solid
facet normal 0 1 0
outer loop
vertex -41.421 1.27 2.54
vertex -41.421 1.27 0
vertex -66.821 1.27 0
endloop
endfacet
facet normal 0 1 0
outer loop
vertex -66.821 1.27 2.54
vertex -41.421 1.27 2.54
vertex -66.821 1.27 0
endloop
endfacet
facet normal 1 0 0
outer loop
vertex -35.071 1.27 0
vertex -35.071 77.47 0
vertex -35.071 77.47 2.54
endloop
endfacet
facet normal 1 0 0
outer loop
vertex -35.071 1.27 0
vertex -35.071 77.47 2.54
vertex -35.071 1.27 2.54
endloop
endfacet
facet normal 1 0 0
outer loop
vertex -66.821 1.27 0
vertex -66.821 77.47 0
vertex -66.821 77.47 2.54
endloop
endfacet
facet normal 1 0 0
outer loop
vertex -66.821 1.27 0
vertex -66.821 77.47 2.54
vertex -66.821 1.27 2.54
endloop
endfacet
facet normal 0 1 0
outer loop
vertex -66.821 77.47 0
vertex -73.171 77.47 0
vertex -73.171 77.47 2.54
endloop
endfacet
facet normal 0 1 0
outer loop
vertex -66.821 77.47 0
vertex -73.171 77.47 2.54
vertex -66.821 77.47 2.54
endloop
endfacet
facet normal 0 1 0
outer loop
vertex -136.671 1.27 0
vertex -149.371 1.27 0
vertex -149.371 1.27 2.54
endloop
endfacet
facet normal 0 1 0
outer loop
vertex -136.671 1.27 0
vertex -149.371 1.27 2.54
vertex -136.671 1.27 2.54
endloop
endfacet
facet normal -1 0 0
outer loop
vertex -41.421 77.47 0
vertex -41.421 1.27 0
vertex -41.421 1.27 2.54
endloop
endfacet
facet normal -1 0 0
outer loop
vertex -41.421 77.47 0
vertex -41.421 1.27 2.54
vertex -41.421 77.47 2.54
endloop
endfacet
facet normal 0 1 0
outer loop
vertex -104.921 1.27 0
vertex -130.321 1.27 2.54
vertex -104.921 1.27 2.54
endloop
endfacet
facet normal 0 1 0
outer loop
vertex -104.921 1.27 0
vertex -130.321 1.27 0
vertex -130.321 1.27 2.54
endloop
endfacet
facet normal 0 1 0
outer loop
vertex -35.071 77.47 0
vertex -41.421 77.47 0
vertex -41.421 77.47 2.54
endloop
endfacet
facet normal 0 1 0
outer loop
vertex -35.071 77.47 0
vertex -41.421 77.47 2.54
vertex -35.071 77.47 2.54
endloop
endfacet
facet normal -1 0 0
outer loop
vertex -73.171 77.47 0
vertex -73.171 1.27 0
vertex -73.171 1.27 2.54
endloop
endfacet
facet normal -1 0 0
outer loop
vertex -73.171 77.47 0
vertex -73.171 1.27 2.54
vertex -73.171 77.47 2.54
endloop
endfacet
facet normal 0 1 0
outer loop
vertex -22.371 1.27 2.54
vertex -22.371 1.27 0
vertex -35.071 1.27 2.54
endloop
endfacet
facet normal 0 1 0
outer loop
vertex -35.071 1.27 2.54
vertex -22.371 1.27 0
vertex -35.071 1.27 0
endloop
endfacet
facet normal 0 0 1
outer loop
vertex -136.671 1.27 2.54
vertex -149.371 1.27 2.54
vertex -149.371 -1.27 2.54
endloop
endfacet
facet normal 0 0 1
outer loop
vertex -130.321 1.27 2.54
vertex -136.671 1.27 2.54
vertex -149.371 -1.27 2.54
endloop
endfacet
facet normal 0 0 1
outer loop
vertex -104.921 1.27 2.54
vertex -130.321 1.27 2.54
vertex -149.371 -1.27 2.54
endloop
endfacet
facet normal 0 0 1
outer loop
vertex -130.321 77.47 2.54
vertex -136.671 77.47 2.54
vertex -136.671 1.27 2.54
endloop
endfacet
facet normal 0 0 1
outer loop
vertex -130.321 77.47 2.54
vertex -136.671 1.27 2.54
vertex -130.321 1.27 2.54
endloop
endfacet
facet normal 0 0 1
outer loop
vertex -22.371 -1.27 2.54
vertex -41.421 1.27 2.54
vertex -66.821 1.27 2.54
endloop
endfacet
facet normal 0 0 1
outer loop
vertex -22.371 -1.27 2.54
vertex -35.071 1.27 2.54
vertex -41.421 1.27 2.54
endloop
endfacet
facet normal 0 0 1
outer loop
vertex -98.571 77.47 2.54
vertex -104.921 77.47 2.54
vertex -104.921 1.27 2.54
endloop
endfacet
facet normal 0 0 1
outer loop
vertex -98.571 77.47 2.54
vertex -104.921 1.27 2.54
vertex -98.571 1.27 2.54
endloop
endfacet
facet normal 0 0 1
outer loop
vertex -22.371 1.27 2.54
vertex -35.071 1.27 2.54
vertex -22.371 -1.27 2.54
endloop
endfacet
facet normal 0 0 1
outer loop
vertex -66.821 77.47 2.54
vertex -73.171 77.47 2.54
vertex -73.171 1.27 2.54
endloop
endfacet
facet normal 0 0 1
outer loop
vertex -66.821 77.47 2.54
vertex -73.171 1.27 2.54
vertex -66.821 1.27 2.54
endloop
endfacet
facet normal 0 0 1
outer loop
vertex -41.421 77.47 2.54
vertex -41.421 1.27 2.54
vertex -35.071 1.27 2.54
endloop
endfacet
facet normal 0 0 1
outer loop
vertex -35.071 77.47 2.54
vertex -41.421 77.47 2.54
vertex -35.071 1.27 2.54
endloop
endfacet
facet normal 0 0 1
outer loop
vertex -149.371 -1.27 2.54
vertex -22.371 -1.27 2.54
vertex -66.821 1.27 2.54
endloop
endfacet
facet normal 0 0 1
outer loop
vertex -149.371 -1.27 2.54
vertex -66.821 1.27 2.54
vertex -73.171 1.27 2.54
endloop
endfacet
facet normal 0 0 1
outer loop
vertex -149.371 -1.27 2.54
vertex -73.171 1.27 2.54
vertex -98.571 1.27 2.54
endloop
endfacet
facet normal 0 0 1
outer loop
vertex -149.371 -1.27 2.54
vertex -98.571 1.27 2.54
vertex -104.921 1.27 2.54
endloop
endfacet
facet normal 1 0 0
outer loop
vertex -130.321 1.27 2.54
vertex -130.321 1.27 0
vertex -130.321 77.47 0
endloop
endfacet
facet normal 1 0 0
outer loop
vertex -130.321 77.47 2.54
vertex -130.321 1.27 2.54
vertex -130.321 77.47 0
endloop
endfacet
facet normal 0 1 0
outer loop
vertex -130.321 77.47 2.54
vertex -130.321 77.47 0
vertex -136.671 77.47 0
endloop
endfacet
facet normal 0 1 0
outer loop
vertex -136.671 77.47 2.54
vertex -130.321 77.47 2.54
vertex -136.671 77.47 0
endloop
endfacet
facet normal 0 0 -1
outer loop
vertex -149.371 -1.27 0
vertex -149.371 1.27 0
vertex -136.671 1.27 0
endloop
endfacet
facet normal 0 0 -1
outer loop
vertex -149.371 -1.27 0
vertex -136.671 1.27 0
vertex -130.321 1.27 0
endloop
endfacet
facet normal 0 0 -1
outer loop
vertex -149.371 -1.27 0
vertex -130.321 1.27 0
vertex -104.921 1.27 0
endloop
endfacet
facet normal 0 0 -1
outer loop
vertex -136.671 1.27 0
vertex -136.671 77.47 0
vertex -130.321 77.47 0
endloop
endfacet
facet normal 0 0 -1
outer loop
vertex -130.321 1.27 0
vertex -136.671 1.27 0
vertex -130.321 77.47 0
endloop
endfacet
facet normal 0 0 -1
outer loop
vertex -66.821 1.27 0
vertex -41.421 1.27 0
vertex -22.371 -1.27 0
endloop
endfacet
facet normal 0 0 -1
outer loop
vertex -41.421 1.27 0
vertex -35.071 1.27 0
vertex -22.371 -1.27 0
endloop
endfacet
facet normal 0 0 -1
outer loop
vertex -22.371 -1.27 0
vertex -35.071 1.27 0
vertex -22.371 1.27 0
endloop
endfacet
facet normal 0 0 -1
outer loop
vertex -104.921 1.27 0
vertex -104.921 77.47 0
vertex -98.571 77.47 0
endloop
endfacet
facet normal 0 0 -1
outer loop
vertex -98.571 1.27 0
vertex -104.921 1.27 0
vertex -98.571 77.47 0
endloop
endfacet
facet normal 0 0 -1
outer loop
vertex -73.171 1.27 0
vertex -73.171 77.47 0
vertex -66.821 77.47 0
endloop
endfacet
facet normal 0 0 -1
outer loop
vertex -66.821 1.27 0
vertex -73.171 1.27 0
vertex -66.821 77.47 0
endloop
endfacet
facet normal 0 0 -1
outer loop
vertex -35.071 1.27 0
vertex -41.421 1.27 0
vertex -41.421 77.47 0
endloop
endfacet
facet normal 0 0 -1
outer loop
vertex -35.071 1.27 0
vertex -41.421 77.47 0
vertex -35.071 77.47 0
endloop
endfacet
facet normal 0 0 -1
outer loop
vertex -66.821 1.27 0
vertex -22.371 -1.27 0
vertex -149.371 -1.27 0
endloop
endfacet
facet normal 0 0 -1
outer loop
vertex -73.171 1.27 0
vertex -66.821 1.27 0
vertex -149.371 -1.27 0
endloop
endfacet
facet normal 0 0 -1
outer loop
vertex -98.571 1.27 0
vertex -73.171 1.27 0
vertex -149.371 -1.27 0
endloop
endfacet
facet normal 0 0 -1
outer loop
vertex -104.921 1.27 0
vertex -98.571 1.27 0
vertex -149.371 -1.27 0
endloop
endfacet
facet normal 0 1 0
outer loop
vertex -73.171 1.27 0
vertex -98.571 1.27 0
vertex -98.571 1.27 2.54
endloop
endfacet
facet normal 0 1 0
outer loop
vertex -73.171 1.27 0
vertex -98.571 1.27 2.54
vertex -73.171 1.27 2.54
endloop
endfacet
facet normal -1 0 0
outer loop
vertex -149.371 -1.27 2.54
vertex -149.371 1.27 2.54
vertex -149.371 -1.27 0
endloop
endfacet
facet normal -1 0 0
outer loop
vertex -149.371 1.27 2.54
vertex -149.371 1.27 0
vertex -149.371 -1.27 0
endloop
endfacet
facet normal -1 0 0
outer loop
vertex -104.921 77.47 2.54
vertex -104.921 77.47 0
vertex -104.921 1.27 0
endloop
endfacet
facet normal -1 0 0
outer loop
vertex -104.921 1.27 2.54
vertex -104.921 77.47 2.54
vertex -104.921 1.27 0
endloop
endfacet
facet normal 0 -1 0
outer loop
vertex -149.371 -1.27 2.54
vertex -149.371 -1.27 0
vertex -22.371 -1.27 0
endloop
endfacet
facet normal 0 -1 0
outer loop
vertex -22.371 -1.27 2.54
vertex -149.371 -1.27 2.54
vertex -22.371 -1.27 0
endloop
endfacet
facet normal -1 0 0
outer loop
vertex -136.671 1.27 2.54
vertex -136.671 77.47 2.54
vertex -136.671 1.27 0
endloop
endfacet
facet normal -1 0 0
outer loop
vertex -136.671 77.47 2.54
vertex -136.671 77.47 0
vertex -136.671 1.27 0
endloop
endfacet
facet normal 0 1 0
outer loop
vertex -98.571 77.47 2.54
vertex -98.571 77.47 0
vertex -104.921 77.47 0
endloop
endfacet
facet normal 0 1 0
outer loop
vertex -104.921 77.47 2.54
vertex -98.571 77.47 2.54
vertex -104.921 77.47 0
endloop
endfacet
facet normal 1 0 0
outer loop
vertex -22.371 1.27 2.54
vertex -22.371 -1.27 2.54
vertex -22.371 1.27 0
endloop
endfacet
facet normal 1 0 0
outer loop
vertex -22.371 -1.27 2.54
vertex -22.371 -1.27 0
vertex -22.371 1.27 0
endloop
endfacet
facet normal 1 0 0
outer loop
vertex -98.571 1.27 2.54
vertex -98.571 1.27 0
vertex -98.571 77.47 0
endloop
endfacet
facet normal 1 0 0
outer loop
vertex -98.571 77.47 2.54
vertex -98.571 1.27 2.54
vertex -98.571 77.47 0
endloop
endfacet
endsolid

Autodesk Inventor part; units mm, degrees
ref_plane "YZ Plane" through (0, 0, 0) normal (1, 0, 0) x (0, 1, 0)
ref_plane "XZ Plane" through (0, 0, 0) normal (0, 1, 0) x (-1, 0, 0)
ref_plane "XY Plane" through (0, 0, 0) normal (0, 0, 1) x (1, 0, 0)
sketch "Sketch1" plane through (0, 0, 0) normal (0, 0, 1) x (1, 0, 0)
  line L0 (-149.3708, -1.27) -> (-22.3708, -1.27)
  line L1 (-22.3708, -1.27) -> (-22.3708, 1.27)
  line L2 (-149.3708, 1.27) -> (-149.3708, -1.27)
  line L3 (-149.3708, -1.27) -> (-22.3708, 1.27) construction
  line L4 (-22.3708, -1.27) -> (-149.3708, 1.27) construction
  line L5 (-149.3708, 1.27) -> (-136.6708, 1.27)
  line L6 (-22.3708, 1.27) -> (-35.0708, 1.27)
  line L7 (-130.3208, 1.27) -> (-130.3208, 77.47)
  line L8 (-130.3208, 77.47) -> (-136.6708, 77.47)
  line L9 (-136.6708, 77.47) -> (-136.6708, 1.27)
  line L10 (-130.3208, 1.27) -> (-104.9208, 1.27)
  line L11 (-98.5708, 1.27) -> (-98.5708, 77.47)
  line L12 (-98.5708, 77.47) -> (-104.9208, 77.47)
  line L13 (-104.9208, 77.47) -> (-104.9208, 1.27)
  line L14 (-41.4208, 1.27) -> (-41.4208, 77.47)
  line L15 (-41.4208, 77.47) -> (-35.0708, 77.47)
  line L16 (-35.0708, 77.47) -> (-35.0708, 1.27)
  line L17 (-41.4208, 1.27) -> (-66.8208, 1.27)
  line L18 (-73.1708, 1.27) -> (-73.1708, 77.47)
  line L19 (-73.1708, 77.47) -> (-66.8208, 77.47)
  line L20 (-66.8208, 77.47) -> (-66.8208, 1.27)
  line L21 (-98.5708, 1.27) -> (-73.1708, 1.27)
  point P0 (0, 0)
  point P1 (-85.8708, 0)
  dimension "d0" = 127
  dimension "d1" = 2.54
  dimension "d2" = 12.7
  dimension "d3" = 12.7
  dimension "d4" = 6.35
  dimension "d5" = 76.2
  dimension "d6" = 25.4
  dimension "d7" = 6.35
  dimension "d8" = 6.35
  dimension "d9" = 76.2
  dimension "d10" = 25.4
  dimension "d11" = 6.35
  dimension "d12" = 76.2
extrude "Extrusion1" add sketch "Sketch1" along normal blind 2.54
properties part number "Bucket - Rake"
